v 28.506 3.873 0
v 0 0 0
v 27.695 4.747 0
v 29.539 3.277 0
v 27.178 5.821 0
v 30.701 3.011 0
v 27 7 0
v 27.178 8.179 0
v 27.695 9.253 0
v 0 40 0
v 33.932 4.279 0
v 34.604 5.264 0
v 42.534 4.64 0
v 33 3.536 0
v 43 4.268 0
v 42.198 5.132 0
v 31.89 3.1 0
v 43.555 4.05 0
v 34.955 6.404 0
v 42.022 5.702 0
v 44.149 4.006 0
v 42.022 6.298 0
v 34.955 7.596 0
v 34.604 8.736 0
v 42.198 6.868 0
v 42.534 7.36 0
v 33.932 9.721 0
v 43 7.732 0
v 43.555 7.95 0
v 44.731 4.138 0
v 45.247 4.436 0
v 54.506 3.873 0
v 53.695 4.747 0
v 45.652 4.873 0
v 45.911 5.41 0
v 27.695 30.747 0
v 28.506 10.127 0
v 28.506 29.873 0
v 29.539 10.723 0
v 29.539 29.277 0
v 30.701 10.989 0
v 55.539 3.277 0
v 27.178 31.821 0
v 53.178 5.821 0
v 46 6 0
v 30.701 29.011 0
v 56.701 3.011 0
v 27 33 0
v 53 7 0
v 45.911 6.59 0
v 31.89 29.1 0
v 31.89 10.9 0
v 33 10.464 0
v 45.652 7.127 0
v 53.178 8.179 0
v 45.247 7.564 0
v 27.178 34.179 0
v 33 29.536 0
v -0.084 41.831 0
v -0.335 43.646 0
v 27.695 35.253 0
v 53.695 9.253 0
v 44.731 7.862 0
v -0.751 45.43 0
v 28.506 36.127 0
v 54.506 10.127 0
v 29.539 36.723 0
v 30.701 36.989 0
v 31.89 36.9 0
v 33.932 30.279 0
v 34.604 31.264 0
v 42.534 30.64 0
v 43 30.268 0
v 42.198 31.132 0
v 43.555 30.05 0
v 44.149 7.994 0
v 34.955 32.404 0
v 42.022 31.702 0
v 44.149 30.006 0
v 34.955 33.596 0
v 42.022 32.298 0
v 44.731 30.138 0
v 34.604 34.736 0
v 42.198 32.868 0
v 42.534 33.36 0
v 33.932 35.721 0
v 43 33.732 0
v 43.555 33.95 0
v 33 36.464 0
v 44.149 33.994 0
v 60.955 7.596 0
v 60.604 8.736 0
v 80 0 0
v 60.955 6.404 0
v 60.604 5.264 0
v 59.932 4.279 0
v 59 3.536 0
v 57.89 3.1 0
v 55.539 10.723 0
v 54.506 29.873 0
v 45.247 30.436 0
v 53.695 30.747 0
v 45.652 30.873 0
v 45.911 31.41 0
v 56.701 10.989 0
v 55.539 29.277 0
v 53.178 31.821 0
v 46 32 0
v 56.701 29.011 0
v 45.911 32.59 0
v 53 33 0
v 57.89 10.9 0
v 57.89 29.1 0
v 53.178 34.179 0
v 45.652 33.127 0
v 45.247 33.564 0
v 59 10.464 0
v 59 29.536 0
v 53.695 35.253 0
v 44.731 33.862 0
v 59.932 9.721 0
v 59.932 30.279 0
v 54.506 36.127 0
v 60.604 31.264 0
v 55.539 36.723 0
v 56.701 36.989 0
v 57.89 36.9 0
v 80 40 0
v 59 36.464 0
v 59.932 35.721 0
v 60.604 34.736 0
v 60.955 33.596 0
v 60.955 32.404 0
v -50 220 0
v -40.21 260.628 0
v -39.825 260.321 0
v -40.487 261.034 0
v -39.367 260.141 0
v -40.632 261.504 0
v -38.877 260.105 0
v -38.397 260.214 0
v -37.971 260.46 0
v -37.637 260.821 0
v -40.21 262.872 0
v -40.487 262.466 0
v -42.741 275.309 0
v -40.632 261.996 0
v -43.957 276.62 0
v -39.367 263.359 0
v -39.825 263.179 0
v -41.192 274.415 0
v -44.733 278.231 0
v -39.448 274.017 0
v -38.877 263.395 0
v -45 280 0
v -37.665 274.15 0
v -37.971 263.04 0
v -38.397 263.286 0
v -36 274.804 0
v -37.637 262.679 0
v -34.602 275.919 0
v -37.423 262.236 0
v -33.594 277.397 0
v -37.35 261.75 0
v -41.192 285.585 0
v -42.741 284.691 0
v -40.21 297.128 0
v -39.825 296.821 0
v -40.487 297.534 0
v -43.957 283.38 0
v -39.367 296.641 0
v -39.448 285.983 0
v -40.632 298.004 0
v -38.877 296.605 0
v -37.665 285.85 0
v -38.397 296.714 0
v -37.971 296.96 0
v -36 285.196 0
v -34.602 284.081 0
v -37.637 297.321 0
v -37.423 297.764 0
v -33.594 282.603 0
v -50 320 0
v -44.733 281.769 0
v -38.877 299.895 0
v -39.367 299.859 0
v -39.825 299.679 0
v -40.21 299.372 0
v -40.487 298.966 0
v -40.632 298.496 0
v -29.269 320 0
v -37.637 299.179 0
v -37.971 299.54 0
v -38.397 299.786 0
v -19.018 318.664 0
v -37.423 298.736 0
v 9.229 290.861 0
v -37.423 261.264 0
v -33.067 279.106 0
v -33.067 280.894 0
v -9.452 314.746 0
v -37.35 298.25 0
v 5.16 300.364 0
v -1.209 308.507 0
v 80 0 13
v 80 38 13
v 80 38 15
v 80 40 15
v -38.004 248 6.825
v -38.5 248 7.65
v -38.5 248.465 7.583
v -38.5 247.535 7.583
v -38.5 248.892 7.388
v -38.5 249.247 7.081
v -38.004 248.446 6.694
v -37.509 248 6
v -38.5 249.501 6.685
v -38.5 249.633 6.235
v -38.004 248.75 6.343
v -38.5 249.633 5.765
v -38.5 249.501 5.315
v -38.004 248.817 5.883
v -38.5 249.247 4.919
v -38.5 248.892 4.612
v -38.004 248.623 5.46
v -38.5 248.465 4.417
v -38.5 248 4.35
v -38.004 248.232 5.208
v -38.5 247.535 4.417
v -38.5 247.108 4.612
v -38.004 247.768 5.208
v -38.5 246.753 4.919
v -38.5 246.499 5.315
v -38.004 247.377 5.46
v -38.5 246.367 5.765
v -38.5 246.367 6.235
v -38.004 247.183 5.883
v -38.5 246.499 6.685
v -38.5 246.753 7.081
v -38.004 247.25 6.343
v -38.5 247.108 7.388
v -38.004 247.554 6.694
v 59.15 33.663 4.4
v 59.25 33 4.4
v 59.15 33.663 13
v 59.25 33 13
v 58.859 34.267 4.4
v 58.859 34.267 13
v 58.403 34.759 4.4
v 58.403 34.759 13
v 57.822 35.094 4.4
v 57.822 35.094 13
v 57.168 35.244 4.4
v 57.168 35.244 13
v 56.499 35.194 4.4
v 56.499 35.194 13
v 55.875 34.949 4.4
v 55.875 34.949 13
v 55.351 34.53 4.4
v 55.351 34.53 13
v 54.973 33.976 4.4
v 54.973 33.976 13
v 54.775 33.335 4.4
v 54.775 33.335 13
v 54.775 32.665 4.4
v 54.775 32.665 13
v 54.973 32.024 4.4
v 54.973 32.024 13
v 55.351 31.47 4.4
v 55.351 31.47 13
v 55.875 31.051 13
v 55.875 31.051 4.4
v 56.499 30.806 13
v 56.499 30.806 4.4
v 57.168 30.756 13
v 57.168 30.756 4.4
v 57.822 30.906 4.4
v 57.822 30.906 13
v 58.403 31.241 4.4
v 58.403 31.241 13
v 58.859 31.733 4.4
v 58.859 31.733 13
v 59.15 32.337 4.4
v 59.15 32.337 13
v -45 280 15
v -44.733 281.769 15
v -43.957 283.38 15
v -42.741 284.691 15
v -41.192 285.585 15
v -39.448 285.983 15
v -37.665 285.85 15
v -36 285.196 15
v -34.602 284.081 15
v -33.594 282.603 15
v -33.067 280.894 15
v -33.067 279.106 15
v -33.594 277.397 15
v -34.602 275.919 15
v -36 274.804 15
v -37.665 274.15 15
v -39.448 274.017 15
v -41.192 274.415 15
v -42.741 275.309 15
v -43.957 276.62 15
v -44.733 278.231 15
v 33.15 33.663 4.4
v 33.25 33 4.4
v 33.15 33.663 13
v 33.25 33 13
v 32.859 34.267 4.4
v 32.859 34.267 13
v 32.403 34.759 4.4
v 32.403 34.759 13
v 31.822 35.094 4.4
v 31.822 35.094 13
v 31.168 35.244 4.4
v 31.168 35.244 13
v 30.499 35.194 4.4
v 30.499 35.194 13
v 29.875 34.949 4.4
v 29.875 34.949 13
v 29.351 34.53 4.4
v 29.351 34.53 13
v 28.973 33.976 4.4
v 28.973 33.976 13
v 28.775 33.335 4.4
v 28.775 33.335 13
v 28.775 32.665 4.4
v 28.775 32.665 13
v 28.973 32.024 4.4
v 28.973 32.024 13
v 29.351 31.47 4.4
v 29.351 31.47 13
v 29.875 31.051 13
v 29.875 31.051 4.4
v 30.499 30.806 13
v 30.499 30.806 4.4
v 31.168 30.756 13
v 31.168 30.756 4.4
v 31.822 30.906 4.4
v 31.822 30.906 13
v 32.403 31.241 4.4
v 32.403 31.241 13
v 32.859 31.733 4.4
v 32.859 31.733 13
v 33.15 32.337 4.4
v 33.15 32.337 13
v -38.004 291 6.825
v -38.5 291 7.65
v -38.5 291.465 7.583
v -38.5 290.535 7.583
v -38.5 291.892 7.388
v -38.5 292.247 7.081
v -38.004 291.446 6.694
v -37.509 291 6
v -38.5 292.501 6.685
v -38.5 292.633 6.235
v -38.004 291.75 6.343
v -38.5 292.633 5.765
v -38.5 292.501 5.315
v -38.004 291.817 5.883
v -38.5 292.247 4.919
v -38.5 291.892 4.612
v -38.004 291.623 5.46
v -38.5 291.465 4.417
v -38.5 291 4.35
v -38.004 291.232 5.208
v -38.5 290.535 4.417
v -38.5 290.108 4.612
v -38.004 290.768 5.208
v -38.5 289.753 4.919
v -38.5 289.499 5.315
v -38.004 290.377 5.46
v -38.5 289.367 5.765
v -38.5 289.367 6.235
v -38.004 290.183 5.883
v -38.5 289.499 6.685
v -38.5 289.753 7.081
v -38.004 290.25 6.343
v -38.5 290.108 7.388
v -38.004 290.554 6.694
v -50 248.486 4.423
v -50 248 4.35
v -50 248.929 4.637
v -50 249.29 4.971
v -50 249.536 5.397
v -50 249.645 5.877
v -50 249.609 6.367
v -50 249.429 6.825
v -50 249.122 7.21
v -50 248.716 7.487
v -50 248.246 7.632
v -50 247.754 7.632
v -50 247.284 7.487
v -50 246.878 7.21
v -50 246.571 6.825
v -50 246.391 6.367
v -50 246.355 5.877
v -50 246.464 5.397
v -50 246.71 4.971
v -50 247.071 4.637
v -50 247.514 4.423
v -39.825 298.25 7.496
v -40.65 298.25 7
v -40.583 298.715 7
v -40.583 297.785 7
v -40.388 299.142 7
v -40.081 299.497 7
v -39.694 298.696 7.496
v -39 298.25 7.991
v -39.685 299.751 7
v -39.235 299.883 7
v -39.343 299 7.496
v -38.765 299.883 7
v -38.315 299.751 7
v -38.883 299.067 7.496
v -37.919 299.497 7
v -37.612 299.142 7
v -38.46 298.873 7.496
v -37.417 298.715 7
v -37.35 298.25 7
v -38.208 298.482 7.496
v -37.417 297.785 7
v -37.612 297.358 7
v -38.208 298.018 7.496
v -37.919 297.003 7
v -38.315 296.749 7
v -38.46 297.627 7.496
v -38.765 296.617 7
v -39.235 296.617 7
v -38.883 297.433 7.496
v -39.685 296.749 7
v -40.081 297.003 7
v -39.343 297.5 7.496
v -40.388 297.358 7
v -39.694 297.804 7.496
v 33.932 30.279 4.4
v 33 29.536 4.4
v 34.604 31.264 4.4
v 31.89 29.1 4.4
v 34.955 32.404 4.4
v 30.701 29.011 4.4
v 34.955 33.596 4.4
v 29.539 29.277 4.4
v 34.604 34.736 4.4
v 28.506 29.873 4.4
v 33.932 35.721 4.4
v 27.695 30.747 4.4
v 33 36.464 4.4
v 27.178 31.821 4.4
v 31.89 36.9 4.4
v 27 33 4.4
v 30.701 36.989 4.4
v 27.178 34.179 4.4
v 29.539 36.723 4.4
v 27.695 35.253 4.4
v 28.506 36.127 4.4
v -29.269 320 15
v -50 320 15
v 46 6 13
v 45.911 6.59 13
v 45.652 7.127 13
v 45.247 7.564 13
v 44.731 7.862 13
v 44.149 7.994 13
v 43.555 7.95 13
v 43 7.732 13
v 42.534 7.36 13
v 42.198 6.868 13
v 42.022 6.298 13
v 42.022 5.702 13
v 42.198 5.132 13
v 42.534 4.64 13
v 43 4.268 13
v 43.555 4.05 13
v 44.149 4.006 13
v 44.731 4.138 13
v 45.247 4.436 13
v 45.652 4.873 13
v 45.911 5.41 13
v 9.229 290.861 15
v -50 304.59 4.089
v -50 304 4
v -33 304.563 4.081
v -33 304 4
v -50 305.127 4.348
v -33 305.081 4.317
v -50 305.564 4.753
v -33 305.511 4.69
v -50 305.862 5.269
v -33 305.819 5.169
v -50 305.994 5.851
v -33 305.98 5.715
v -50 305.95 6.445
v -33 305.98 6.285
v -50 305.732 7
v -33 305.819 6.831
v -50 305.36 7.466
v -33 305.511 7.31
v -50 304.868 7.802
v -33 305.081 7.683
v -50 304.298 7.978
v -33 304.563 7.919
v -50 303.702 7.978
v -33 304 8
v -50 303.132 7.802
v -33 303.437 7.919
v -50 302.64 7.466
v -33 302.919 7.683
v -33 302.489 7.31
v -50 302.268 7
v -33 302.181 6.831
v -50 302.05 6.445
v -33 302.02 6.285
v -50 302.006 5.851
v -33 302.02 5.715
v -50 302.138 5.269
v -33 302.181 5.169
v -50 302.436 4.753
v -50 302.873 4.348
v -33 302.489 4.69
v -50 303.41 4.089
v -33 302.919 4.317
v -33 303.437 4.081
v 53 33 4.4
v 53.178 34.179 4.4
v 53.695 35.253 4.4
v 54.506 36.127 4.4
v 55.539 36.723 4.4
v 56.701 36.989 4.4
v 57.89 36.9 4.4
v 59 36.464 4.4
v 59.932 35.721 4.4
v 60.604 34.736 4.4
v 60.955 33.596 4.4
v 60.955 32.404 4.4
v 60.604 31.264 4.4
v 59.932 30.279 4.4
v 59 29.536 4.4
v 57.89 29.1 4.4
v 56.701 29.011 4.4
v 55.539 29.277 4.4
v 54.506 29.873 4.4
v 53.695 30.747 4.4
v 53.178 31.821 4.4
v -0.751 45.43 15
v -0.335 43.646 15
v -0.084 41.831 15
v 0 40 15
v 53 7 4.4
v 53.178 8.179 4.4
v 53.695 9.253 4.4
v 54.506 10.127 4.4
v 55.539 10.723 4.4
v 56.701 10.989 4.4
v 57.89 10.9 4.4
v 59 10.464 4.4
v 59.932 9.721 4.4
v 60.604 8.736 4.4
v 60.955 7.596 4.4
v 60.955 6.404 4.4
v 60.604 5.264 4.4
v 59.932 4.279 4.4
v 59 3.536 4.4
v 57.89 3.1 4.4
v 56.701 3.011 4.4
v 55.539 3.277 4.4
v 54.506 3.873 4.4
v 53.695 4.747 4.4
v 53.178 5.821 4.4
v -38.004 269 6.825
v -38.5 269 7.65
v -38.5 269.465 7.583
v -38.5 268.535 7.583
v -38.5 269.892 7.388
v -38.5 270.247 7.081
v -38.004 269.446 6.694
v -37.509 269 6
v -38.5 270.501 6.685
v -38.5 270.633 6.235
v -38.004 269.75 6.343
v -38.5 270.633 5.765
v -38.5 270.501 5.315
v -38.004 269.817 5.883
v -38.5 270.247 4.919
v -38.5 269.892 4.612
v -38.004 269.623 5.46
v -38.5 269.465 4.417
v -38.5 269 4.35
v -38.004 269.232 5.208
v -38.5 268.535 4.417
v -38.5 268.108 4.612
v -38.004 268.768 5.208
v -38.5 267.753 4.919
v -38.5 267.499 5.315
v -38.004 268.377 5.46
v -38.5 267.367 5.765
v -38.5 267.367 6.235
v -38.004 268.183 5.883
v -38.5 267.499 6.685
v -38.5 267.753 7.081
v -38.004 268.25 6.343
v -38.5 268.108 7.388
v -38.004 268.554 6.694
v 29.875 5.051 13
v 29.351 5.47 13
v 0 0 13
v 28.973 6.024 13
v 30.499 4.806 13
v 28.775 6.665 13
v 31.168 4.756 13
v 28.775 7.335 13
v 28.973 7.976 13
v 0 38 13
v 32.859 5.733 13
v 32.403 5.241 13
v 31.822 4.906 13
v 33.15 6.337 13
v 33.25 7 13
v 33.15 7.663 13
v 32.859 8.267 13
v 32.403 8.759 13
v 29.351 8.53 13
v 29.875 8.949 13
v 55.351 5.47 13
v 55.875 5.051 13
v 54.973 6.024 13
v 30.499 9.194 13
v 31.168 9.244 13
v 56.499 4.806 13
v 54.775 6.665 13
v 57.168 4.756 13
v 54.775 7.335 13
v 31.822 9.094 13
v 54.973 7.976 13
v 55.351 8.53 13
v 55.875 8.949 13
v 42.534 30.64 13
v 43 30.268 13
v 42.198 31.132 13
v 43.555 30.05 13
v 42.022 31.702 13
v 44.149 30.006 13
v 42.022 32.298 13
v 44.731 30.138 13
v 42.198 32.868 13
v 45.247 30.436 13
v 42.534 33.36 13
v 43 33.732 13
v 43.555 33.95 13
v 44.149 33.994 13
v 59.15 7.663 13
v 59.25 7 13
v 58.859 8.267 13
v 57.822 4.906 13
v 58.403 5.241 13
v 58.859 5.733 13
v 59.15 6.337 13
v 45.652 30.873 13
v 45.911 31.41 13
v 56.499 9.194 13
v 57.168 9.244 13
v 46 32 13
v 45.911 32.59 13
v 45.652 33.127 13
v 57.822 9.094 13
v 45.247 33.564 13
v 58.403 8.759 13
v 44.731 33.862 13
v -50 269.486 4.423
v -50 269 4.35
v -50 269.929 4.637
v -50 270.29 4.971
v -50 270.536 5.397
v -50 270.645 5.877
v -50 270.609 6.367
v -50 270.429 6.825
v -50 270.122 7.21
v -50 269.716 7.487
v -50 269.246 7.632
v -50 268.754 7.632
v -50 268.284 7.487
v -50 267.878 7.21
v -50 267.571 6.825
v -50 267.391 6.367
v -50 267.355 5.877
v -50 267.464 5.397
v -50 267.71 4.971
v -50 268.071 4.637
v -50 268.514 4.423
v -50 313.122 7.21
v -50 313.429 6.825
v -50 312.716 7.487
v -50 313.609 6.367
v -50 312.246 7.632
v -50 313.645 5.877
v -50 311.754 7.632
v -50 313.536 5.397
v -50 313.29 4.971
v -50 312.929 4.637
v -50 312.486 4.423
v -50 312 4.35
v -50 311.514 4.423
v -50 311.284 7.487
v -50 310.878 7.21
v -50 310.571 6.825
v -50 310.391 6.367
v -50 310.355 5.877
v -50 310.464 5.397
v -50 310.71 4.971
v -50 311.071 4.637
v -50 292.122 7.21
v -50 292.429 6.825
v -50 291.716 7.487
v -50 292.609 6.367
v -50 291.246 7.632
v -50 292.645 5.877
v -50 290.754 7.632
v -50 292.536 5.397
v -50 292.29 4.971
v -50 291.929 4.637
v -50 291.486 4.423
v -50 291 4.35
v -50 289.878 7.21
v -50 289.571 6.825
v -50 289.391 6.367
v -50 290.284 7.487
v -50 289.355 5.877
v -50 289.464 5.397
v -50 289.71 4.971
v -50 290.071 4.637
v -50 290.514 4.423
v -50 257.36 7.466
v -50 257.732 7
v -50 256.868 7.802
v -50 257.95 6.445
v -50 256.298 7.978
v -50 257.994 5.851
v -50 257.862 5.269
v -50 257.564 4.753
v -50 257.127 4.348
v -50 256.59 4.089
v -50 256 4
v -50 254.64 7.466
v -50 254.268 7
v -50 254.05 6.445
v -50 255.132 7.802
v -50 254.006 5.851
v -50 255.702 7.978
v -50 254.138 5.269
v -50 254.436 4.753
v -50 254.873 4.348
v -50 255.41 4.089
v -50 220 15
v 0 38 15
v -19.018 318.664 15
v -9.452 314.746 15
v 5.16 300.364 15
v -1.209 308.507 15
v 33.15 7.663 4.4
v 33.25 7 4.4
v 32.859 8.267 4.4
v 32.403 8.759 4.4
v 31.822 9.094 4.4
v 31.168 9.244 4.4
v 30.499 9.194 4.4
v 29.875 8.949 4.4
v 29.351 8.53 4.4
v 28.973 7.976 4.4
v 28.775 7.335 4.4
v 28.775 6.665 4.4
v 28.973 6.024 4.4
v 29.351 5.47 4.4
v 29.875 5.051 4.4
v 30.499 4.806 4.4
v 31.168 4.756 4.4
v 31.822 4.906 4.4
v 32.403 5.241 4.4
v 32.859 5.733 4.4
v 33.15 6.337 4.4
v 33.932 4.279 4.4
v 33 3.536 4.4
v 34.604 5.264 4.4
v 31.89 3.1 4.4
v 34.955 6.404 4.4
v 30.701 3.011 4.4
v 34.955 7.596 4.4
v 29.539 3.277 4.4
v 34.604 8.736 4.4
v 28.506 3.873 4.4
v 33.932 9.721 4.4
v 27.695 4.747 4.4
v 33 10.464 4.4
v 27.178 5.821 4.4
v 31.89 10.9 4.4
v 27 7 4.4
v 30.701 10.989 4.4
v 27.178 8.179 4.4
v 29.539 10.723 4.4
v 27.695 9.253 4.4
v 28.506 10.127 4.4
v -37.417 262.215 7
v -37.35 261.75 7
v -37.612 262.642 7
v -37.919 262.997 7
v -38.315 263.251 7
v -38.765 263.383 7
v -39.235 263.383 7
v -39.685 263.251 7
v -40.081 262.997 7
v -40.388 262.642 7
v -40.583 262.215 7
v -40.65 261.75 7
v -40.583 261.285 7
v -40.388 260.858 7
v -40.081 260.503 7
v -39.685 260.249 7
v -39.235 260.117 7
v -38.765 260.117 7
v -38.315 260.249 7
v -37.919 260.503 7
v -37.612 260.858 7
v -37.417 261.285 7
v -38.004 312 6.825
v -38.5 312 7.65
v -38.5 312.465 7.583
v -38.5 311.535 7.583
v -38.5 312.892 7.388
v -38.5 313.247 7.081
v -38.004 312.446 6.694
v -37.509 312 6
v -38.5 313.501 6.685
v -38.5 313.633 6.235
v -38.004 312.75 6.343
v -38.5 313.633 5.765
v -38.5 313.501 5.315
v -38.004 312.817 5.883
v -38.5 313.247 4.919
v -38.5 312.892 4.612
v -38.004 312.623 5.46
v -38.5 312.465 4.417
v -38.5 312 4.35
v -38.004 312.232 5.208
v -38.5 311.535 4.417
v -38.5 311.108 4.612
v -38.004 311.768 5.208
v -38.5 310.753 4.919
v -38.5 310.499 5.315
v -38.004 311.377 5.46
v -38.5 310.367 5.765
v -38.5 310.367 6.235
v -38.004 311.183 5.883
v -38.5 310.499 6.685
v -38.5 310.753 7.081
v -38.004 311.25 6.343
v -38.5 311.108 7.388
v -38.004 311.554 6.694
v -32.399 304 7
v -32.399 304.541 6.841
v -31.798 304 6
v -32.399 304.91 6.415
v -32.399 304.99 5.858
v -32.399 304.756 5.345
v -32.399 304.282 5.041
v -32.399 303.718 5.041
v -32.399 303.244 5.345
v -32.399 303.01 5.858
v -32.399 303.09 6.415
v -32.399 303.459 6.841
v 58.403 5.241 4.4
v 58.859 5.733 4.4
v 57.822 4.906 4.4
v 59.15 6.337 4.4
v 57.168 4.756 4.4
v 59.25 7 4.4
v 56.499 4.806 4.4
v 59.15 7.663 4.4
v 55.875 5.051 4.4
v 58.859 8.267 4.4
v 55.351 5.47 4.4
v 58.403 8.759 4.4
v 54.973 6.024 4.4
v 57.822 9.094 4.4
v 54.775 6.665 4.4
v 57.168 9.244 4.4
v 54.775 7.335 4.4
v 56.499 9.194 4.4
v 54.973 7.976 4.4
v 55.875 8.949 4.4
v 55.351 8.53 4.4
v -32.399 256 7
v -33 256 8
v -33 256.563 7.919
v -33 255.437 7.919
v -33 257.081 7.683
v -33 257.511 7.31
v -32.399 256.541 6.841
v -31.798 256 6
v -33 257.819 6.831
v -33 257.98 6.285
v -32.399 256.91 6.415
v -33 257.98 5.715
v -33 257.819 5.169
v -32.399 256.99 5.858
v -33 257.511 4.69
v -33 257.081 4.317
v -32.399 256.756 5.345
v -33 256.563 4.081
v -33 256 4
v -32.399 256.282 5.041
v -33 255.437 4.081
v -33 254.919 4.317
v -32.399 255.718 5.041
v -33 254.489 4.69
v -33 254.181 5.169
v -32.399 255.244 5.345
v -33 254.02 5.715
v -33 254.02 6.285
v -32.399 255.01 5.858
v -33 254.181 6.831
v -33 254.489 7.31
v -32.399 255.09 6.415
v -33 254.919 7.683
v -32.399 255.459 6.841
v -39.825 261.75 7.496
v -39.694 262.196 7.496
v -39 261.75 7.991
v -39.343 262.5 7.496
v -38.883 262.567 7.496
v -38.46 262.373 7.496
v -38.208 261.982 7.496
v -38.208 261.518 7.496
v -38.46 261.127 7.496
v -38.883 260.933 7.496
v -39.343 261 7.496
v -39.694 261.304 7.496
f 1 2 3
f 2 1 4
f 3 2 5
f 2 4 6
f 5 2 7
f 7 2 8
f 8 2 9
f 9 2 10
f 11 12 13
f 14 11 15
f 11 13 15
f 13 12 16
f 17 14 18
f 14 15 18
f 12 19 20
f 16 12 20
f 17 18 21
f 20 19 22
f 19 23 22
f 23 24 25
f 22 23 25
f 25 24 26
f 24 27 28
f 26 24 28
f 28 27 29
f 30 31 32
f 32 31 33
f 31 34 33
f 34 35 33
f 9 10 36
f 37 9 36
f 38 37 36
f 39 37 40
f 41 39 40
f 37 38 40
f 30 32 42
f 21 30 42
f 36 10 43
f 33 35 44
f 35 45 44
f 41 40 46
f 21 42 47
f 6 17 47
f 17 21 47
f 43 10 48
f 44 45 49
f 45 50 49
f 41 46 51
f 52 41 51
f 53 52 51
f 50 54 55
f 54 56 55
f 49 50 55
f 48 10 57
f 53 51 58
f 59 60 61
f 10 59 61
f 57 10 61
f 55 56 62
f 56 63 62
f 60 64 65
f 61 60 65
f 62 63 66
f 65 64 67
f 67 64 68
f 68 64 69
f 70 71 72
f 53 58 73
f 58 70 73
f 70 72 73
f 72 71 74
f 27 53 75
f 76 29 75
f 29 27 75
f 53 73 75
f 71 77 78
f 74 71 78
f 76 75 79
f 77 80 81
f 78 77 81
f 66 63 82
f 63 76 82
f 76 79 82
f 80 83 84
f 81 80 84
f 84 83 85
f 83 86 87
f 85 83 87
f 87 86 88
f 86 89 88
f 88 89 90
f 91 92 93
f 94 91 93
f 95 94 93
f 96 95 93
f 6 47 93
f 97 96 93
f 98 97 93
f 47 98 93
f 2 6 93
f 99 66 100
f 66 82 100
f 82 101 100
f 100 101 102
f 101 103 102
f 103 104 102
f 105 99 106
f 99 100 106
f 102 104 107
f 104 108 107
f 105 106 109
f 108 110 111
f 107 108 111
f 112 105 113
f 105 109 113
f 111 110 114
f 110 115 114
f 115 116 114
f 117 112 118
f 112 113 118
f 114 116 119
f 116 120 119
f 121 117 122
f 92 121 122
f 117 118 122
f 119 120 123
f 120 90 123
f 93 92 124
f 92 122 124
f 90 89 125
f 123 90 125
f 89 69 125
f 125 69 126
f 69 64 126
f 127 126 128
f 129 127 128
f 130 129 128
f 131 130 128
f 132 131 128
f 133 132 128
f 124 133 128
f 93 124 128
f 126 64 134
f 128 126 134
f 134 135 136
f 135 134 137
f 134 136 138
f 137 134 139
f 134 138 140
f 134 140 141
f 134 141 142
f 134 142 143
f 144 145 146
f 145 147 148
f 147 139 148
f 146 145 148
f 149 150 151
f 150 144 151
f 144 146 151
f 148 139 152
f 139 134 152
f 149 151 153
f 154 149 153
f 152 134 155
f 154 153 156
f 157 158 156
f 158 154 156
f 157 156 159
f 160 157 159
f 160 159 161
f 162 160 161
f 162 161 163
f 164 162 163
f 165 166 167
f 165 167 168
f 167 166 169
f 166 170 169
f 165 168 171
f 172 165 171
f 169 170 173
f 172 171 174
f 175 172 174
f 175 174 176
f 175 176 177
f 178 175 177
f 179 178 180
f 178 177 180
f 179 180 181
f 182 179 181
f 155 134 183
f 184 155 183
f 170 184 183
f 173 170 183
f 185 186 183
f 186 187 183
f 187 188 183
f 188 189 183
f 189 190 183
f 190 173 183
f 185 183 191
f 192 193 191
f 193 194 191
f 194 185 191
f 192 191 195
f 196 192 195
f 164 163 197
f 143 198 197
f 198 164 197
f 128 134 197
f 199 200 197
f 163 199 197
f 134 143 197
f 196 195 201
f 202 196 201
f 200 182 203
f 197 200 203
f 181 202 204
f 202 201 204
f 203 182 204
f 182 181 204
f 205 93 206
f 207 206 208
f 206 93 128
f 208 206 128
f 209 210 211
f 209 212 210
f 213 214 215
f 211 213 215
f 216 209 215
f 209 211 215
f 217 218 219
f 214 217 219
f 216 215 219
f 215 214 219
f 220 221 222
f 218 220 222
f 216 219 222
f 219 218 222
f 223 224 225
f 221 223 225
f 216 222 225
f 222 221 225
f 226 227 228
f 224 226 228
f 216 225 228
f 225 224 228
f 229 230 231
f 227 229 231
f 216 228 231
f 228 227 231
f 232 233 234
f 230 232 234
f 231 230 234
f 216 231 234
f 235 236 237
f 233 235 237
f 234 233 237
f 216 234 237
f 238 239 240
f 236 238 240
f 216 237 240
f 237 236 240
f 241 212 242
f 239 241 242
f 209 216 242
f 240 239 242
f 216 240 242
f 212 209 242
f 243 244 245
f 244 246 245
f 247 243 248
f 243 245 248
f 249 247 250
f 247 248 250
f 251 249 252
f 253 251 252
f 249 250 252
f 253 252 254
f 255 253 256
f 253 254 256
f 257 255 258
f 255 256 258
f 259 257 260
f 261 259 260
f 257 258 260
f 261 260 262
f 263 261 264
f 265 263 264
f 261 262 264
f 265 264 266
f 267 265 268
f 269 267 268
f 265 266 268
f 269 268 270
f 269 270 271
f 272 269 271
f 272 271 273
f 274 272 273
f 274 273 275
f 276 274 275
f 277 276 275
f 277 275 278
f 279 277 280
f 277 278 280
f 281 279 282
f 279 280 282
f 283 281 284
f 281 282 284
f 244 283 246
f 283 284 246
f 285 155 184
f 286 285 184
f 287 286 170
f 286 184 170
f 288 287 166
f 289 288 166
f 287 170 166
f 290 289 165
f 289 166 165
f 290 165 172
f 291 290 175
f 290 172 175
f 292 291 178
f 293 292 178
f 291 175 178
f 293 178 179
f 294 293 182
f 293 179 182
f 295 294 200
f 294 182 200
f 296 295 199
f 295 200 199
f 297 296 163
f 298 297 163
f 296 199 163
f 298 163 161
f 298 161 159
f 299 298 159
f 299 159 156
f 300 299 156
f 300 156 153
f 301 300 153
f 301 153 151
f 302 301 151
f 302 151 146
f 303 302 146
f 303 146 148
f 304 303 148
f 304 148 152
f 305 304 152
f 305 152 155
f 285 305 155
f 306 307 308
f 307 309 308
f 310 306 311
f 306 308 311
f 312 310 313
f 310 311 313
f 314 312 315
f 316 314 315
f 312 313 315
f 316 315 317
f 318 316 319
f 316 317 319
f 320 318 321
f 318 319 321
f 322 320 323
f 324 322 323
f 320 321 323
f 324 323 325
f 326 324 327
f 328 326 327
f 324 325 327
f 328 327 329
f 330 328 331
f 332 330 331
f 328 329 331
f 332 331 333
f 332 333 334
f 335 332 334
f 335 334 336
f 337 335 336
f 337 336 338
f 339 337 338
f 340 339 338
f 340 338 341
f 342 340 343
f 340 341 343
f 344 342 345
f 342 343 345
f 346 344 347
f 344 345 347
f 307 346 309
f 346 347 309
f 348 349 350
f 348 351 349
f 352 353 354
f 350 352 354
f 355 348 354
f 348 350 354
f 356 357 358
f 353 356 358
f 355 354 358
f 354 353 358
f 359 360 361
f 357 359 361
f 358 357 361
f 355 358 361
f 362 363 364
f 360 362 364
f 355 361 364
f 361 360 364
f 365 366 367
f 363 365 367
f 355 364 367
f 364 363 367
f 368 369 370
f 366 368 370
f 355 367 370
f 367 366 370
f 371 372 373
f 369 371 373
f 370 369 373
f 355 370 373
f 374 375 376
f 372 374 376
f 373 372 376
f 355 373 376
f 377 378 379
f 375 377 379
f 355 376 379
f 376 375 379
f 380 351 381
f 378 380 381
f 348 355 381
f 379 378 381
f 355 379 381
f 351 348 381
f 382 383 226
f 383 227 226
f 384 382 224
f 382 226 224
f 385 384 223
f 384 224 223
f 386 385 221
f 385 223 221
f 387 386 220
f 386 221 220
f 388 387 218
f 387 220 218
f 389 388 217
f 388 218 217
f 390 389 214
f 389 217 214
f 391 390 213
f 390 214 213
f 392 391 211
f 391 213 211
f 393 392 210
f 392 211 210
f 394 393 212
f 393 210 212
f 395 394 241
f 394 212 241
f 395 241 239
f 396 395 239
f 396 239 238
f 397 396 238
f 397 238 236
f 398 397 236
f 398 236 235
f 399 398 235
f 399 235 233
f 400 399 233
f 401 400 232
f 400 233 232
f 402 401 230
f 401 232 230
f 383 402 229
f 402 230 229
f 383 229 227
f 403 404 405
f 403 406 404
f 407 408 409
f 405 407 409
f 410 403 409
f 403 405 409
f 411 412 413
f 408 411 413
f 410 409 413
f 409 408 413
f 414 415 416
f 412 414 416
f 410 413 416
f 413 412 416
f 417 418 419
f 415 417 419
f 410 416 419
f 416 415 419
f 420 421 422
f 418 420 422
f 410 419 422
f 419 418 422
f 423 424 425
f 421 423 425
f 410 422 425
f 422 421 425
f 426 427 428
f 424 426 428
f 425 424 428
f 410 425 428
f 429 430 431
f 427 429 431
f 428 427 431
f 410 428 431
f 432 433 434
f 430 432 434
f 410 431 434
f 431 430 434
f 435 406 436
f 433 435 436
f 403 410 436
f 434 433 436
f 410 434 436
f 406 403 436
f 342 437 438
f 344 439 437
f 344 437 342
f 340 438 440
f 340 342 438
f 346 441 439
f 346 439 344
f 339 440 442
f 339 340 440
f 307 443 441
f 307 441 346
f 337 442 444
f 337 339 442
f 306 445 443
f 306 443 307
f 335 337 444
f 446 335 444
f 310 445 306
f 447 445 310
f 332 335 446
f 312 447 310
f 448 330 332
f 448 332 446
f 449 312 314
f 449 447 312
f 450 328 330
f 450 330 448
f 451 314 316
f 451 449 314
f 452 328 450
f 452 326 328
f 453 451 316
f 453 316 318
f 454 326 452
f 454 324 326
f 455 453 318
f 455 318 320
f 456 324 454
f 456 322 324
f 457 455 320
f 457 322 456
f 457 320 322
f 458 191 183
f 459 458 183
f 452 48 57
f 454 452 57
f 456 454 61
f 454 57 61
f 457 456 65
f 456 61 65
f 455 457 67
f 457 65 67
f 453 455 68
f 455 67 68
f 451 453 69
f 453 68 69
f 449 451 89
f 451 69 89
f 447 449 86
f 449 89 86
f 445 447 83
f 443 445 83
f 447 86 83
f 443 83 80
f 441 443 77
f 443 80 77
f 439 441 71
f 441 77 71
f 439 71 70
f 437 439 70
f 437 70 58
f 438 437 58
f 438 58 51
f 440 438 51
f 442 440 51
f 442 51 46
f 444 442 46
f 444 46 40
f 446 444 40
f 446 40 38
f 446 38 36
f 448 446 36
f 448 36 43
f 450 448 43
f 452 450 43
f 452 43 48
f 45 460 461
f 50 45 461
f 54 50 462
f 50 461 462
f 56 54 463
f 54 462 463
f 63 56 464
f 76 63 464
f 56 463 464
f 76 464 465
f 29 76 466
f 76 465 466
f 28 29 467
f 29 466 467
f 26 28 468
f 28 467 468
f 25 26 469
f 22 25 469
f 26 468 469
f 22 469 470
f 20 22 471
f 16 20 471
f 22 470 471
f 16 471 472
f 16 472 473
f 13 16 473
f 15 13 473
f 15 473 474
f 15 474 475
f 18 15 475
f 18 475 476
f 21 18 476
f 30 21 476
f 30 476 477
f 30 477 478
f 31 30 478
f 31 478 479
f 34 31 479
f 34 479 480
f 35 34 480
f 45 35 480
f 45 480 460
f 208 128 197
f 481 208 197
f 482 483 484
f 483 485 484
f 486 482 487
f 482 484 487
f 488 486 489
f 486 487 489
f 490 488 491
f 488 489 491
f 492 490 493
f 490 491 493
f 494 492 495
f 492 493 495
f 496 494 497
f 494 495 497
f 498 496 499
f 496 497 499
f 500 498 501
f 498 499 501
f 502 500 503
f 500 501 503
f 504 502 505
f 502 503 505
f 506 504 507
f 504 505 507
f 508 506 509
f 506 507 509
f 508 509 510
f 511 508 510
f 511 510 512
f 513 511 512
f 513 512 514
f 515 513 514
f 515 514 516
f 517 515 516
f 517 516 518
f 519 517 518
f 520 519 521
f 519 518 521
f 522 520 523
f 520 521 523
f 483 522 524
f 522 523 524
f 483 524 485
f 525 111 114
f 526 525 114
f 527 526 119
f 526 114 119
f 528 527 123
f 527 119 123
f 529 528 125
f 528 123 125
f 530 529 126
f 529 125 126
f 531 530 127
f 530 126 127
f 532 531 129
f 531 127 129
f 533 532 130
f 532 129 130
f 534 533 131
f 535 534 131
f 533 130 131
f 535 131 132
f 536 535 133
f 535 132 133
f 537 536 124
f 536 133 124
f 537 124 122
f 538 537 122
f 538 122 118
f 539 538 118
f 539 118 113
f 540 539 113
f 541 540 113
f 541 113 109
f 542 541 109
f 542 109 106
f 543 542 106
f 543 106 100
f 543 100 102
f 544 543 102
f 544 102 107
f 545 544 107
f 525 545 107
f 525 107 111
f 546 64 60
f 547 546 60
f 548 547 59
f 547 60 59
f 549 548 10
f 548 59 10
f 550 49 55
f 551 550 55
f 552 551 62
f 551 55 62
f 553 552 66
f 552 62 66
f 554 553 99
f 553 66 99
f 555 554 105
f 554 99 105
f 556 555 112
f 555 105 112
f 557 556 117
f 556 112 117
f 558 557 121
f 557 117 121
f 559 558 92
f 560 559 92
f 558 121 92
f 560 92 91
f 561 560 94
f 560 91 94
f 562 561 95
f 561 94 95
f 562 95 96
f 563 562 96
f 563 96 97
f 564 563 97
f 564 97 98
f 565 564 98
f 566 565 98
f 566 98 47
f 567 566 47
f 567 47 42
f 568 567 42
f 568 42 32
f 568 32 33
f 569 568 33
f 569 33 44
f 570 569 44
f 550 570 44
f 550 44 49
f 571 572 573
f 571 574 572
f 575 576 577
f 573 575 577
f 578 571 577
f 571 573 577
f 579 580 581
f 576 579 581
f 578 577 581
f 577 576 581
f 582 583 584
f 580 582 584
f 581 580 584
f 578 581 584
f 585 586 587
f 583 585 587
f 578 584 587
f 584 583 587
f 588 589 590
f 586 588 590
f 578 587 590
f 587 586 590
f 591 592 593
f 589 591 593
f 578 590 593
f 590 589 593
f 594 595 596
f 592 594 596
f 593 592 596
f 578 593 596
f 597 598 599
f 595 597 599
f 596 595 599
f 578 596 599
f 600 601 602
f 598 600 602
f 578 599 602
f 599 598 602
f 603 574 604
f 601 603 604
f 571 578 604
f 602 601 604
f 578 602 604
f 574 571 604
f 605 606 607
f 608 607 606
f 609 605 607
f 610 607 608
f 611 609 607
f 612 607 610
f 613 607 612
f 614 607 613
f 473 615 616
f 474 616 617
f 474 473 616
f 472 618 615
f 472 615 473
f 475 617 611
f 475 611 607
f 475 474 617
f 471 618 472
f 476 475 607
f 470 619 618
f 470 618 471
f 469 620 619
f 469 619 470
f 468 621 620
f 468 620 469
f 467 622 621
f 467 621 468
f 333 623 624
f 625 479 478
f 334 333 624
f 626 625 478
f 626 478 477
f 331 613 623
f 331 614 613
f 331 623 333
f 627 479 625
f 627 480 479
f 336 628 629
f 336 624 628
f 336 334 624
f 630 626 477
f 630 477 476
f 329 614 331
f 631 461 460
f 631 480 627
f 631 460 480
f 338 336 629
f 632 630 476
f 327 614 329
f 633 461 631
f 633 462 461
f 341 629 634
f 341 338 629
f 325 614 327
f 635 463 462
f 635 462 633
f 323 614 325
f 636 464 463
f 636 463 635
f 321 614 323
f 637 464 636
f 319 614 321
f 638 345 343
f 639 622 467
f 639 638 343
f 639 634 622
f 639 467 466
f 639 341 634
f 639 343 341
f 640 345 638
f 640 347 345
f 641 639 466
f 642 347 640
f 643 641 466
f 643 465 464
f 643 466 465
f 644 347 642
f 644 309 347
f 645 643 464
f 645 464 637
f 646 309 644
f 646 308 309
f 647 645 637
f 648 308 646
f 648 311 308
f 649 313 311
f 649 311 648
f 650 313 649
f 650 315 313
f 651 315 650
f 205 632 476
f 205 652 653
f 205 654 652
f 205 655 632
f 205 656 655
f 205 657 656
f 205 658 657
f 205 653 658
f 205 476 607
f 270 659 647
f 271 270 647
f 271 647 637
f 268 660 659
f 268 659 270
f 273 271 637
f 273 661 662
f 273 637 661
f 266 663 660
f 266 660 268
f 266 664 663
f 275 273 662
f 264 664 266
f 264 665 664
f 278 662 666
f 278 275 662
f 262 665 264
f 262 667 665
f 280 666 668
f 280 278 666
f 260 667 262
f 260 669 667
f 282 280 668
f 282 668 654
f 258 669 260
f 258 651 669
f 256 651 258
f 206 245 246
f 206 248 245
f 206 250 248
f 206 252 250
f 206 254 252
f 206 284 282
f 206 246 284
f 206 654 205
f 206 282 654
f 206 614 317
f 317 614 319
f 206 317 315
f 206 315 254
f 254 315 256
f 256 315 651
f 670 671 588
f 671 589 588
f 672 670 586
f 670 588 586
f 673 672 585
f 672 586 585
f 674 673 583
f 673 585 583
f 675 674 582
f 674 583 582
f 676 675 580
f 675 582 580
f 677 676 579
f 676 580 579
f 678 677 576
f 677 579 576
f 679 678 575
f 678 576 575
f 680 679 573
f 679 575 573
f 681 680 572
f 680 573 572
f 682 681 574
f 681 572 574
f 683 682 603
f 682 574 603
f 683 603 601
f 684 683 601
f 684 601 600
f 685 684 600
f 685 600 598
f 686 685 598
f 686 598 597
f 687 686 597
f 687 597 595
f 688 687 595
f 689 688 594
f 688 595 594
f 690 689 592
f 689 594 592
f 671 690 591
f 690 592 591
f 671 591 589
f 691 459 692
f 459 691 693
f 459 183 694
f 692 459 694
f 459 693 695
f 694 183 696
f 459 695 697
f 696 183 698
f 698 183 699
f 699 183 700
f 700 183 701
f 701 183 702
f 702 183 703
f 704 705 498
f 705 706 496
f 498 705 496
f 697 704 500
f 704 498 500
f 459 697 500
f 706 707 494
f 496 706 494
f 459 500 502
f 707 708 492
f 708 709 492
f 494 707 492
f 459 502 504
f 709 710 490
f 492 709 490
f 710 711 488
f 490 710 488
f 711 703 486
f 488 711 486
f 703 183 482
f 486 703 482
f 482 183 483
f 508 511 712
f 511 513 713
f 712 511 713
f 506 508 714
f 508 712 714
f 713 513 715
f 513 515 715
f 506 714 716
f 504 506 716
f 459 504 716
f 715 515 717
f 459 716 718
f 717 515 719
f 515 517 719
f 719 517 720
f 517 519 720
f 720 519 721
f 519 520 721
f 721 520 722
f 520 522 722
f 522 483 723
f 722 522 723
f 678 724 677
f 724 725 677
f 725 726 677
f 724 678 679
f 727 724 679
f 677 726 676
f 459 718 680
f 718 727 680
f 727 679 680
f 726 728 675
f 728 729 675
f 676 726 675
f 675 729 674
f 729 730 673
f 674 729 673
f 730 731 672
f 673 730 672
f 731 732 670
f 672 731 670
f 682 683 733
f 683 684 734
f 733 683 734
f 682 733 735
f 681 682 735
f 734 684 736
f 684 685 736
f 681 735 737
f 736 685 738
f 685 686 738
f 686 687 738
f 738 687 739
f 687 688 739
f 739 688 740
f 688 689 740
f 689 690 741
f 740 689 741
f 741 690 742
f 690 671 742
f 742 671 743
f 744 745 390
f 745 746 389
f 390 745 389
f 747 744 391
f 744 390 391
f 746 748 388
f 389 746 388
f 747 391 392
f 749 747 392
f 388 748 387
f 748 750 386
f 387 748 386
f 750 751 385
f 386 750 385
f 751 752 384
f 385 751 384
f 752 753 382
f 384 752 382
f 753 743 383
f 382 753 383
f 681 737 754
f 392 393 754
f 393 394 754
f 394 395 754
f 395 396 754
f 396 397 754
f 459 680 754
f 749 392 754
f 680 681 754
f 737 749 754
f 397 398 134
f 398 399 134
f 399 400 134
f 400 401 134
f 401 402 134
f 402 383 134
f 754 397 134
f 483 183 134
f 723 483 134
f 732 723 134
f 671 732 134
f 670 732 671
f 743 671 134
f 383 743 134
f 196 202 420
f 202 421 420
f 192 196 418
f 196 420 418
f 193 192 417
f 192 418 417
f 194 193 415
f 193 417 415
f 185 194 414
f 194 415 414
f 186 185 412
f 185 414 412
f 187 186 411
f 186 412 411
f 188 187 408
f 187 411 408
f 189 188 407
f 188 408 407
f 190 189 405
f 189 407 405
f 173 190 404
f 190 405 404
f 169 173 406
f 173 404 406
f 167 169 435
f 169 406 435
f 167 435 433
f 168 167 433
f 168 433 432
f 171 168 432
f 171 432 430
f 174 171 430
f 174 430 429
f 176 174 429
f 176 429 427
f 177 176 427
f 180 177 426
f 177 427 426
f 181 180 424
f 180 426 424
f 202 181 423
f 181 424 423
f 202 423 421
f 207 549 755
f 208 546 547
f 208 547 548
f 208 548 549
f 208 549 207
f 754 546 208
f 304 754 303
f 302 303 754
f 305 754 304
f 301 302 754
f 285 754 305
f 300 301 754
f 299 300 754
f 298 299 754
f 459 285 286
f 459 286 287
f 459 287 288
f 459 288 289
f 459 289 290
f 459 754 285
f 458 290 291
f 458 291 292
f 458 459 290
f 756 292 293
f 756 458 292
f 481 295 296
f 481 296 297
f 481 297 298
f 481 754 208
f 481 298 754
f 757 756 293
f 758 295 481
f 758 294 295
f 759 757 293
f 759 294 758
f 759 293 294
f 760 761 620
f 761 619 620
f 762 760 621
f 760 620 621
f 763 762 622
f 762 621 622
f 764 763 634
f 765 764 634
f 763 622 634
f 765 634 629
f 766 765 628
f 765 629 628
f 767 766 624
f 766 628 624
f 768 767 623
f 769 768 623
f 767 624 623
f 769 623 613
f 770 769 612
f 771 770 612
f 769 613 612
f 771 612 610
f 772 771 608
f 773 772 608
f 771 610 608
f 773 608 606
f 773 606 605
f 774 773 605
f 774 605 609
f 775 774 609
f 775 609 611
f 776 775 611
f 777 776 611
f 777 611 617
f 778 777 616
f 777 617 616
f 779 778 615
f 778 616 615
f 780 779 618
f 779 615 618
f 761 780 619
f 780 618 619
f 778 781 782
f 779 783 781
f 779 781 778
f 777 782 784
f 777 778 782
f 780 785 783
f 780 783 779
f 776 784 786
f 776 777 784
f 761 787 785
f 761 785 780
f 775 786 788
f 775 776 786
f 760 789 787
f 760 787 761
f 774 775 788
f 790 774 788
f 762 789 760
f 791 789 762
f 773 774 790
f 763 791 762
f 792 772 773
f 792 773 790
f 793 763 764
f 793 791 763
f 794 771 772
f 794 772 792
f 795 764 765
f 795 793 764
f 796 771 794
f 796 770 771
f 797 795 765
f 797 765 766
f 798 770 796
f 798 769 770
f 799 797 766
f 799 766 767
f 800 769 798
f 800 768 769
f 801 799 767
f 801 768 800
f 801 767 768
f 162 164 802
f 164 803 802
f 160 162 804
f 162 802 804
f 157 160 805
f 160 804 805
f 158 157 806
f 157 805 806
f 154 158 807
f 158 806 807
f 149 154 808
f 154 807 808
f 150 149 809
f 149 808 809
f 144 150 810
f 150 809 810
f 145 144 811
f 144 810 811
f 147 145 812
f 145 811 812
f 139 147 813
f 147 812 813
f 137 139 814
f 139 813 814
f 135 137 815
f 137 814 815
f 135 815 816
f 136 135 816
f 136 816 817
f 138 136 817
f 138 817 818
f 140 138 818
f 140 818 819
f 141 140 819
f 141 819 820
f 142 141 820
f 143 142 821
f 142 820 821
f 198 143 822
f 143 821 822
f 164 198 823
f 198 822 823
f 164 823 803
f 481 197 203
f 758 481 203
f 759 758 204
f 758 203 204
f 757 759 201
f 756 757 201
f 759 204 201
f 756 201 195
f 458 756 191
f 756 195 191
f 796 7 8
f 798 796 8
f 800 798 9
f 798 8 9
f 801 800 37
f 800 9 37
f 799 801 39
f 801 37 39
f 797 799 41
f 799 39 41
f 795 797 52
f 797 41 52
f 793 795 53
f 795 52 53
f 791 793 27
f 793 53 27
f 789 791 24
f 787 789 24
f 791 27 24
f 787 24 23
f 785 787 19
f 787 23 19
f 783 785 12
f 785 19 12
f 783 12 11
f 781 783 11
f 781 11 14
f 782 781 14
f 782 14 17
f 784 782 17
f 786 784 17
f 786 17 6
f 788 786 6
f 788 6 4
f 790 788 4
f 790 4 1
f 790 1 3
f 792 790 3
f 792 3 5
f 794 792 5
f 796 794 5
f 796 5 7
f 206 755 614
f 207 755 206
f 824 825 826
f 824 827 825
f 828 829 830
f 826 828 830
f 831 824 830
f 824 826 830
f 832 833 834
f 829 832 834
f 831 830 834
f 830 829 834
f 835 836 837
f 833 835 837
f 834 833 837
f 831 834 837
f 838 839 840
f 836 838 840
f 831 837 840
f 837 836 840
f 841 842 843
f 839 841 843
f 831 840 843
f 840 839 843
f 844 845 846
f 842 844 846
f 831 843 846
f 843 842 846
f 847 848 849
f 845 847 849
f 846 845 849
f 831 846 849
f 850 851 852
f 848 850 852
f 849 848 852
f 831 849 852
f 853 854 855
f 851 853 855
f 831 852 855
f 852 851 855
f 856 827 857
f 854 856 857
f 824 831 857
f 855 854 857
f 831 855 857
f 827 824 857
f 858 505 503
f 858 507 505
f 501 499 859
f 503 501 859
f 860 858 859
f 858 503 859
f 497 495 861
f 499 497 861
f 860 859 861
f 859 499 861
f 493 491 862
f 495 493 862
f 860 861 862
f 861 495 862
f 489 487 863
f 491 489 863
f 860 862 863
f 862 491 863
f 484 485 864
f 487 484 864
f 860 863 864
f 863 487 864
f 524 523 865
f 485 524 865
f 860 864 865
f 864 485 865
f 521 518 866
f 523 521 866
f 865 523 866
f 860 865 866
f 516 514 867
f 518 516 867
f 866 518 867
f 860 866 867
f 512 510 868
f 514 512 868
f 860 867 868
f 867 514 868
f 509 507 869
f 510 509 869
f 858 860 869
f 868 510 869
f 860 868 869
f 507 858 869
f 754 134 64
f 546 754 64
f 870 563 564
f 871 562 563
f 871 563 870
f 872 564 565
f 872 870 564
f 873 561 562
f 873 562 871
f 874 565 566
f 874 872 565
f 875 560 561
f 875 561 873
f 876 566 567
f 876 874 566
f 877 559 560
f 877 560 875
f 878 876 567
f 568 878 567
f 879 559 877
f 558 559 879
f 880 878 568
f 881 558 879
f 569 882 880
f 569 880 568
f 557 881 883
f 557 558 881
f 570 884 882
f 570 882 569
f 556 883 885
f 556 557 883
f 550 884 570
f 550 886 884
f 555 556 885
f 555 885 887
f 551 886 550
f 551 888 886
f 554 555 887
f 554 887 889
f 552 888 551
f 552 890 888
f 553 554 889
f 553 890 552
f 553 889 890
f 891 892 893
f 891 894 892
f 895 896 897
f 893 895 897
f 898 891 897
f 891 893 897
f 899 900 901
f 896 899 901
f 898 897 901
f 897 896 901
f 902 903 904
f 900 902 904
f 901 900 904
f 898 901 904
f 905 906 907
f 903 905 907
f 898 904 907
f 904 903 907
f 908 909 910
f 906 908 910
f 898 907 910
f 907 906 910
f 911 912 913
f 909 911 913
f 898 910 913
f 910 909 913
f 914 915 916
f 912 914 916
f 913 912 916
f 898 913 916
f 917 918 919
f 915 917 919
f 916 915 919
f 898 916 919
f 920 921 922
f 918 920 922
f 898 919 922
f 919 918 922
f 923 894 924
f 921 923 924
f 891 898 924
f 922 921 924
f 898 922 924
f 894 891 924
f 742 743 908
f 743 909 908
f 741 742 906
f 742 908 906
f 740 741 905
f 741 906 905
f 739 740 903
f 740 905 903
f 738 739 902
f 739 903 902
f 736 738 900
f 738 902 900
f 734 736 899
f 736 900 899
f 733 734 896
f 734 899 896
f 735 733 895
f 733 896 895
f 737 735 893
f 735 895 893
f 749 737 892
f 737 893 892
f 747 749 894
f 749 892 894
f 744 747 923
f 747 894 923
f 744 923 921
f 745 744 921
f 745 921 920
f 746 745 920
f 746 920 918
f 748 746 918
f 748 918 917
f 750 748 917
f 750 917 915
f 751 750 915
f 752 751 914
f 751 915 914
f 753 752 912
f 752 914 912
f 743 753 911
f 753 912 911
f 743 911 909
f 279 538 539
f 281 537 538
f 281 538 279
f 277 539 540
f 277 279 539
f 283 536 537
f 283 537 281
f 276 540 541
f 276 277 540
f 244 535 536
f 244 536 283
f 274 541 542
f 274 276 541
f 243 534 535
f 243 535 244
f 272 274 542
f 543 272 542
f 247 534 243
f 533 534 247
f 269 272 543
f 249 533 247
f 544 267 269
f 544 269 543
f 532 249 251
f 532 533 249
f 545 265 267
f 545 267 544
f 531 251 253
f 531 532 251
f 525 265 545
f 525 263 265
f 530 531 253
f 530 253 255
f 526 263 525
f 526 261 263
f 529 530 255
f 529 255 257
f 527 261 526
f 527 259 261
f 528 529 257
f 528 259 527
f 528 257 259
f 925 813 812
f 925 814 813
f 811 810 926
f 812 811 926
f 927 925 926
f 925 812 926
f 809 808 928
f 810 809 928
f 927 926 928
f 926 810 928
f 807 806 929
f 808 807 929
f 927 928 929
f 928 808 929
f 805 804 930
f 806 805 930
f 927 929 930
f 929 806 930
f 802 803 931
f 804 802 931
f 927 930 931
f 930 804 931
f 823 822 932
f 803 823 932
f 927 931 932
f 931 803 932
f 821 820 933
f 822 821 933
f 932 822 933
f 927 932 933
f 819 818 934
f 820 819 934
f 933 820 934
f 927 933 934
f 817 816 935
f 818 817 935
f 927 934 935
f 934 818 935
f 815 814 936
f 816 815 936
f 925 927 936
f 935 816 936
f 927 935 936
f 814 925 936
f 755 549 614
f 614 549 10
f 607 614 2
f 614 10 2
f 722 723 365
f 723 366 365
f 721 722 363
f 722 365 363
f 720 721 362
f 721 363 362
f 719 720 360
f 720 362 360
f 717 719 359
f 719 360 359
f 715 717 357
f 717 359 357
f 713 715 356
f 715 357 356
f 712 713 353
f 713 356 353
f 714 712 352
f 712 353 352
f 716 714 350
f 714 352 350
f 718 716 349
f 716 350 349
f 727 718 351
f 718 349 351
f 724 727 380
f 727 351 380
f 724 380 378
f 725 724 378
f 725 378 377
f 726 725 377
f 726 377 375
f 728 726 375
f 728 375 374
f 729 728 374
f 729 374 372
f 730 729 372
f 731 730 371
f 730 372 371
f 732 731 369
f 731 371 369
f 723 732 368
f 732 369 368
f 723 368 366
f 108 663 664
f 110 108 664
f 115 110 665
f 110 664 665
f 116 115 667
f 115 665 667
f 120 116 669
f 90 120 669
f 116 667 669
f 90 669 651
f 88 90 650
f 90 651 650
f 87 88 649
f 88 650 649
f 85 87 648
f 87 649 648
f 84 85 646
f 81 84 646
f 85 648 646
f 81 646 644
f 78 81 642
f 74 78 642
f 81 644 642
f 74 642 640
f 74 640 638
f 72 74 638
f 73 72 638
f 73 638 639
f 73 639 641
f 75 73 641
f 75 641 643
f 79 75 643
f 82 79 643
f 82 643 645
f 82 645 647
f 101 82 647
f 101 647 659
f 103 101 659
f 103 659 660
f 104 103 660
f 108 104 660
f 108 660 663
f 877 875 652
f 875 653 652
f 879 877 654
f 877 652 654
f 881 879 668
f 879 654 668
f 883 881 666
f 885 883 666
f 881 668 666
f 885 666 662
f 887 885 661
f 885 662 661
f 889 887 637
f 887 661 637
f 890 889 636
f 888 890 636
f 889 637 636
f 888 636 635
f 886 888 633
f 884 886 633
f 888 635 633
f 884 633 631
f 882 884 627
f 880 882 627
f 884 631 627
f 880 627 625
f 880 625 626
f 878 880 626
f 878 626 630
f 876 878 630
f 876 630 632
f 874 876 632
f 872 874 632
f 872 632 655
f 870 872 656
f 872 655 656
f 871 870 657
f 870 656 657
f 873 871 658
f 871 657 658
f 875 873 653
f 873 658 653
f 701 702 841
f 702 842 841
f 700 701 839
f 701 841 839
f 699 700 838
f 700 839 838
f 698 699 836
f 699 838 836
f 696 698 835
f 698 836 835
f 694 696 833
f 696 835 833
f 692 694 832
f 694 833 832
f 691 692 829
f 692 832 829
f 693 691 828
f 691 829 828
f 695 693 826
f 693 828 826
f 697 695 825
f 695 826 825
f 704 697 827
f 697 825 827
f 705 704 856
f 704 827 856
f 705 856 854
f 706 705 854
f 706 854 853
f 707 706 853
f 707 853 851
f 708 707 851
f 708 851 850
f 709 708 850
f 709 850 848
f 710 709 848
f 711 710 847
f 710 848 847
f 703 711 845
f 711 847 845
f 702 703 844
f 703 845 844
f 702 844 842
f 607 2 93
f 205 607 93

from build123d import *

# Parameters (mm, degrees)
SALIENTE_EXTRUIR1_DEPTH                              = 15
CROQUIS2_R                                           = 6
CORTAR_EXTRUIR1_DEPTH                                = 16
PERFORADOR_PARA_ROSCAR_PARA_MACHO_DE_ROS_D           = 3.3
PERFORADOR_PARA_ROSCAR_PARA_MACHO_DE_ROS_DEPTH       = 7
PERFORADOR_PARA_ROSCAR_PARA_MACHO_DE_ROS_TIP         = 0.991420021
CROQUIS9_W                                           = 80
CROQUIS9_H                                           = 38
CORTAR_EXTRUIR2_DEPTH                                = 2
TALADROS_DE_ESPIGA_DE_4_0MM1_D                       = 4
TALADROS_DE_ESPIGA_DE_4_0MM1_DEPTH                   = 17
TALADROS_DE_ESPIGA_DE_4_0MM1_TIP                     = 1.201721238
TALADRO_ROSCADO_M41_D                                = 3.3
TALADRO_ROSCADO_M41_DEPTH                            = 11.5
TALADRO_ROSCADO_M41_TIP                              = 0.991420021
REFRENTADO_PARA_TORNILLO_CON_CABEZA_HUEC_D           = 4.5
REFRENTADO_PARA_TORNILLO_CON_CABEZA_HUEC_CBORE_D     = 8
REFRENTADO_PARA_TORNILLO_CON_CABEZA_HUEC_CBORE_DEPTH = 4.4
TALADROS_DE_ESPIGA_DE_4_0MM2_D                       = 4


with BuildPart() as part:
    # Croquis1 → Saliente-Extruir1 (new body)
    with BuildSketch(Plane.XY):
        with BuildLine():
            Line((80, 0), (80, 40))
            Line((80, 40), (9.228509485, 290.860669242))
            ThreePointArc((9.228509485, 290.860669242), (-5.12786552, 311.893782856), (-29.268839302, 320))
            Line((-29.268839302, 320), (-50, 320))
            Line((-50, 320), (-50, 220))
            Line((-50, 220), (-0.751325607, 45.430334621))
            ThreePointArc((-0.751325607, 45.430334621), (-0.1887218, 42.741031935), (0, 40))
            Line((0, 40), (0, 0))
            Line((0, 0), (80, 0))
        make_face()
    extrude(amount=SALIENTE_EXTRUIR1_DEPTH)

    # Croquis2 → Cortar-Extruir1 (cut, through all)
    with BuildSketch(Plane(origin=(0, 0, 0), x_dir=(-1, 0, 0), z_dir=(0, 0, -1))):
        with Locations((39, 280)):
            Circle(CROQUIS2_R)
    extrude(amount=-CORTAR_EXTRUIR1_DEPTH, mode=Mode.SUBTRACT)

    # Perforador para roscar para macho de roscar para M44
    with Locations(Plane(origin=(0, 0, 0), x_dir=(-1, 0, 0), z_dir=(0, 0, -1))):
        with Locations((39, 261.75), (39, 298.25)):
            Hole(PERFORADOR_PARA_ROSCAR_PARA_MACHO_DE_ROS_D / 2, depth=PERFORADOR_PARA_ROSCAR_PARA_MACHO_DE_ROS_DEPTH)
            with Locations((0, 0, -(PERFORADOR_PARA_ROSCAR_PARA_MACHO_DE_ROS_DEPTH + PERFORADOR_PARA_ROSCAR_PARA_MACHO_DE_ROS_TIP / 2))):  # 118° drill point
                Cone(0, PERFORADOR_PARA_ROSCAR_PARA_MACHO_DE_ROS_D / 2, PERFORADOR_PARA_ROSCAR_PARA_MACHO_DE_ROS_TIP, mode=Mode.SUBTRACT)

    # Croquis9 → Cortar-Extruir2 (cut)
    with BuildSketch(Plane.XY.offset(15)):
        with Locations((40, 19)):
            Rectangle(CROQUIS9_W, CROQUIS9_H)
    extrude(amount=-CORTAR_EXTRUIR2_DEPTH, mode=Mode.SUBTRACT)

    # Taladros de espiga de Ø4.0mm1
    with Locations(Plane.ZY.offset(50)):
        with Locations((6, 304), (6, 256)):
            Hole(TALADROS_DE_ESPIGA_DE_4_0MM1_D / 2, depth=TALADROS_DE_ESPIGA_DE_4_0MM1_DEPTH)
            with Locations((0, 0, -(TALADROS_DE_ESPIGA_DE_4_0MM1_DEPTH + TALADROS_DE_ESPIGA_DE_4_0MM1_TIP / 2))):  # 118° drill point
                Cone(0, TALADROS_DE_ESPIGA_DE_4_0MM1_D / 2, TALADROS_DE_ESPIGA_DE_4_0MM1_TIP, mode=Mode.SUBTRACT)

    # Taladro roscado M41
    with Locations(Plane.ZY.offset(50)):
        with Locations((6, 312), (6, 248), (6, 291), (6, 269)):
            Hole(TALADRO_ROSCADO_M41_D / 2, depth=TALADRO_ROSCADO_M41_DEPTH)
            with Locations((0, 0, -(TALADRO_ROSCADO_M41_DEPTH + TALADRO_ROSCADO_M41_TIP / 2))):  # 118° drill point
                Cone(0, TALADRO_ROSCADO_M41_D / 2, TALADRO_ROSCADO_M41_TIP, mode=Mode.SUBTRACT)

    # Refrentado para tornillo con cabeza hueca de M41 (through all)
    with Locations(Plane(origin=(0, 0, 0), x_dir=(-1, 0, 0), z_dir=(0, 0, -1))):
        with Locations((-57, 7), (-57, 33), (-31, 33), (-31, 7)):
            CounterBoreHole(REFRENTADO_PARA_TORNILLO_CON_CABEZA_HUEC_D / 2, REFRENTADO_PARA_TORNILLO_CON_CABEZA_HUEC_CBORE_D / 2, REFRENTADO_PARA_TORNILLO_CON_CABEZA_HUEC_CBORE_DEPTH)

    # Taladros de espiga de Ø4.0mm2 (through all)
    with Locations(Plane(origin=(0, 0, 0), x_dir=(-1, 0, 0), z_dir=(0, 0, -1))):
        with Locations((-44, 32), (-44, 6)):
            Hole(TALADROS_DE_ESPIGA_DE_4_0MM2_D / 2)


solid = part.part
